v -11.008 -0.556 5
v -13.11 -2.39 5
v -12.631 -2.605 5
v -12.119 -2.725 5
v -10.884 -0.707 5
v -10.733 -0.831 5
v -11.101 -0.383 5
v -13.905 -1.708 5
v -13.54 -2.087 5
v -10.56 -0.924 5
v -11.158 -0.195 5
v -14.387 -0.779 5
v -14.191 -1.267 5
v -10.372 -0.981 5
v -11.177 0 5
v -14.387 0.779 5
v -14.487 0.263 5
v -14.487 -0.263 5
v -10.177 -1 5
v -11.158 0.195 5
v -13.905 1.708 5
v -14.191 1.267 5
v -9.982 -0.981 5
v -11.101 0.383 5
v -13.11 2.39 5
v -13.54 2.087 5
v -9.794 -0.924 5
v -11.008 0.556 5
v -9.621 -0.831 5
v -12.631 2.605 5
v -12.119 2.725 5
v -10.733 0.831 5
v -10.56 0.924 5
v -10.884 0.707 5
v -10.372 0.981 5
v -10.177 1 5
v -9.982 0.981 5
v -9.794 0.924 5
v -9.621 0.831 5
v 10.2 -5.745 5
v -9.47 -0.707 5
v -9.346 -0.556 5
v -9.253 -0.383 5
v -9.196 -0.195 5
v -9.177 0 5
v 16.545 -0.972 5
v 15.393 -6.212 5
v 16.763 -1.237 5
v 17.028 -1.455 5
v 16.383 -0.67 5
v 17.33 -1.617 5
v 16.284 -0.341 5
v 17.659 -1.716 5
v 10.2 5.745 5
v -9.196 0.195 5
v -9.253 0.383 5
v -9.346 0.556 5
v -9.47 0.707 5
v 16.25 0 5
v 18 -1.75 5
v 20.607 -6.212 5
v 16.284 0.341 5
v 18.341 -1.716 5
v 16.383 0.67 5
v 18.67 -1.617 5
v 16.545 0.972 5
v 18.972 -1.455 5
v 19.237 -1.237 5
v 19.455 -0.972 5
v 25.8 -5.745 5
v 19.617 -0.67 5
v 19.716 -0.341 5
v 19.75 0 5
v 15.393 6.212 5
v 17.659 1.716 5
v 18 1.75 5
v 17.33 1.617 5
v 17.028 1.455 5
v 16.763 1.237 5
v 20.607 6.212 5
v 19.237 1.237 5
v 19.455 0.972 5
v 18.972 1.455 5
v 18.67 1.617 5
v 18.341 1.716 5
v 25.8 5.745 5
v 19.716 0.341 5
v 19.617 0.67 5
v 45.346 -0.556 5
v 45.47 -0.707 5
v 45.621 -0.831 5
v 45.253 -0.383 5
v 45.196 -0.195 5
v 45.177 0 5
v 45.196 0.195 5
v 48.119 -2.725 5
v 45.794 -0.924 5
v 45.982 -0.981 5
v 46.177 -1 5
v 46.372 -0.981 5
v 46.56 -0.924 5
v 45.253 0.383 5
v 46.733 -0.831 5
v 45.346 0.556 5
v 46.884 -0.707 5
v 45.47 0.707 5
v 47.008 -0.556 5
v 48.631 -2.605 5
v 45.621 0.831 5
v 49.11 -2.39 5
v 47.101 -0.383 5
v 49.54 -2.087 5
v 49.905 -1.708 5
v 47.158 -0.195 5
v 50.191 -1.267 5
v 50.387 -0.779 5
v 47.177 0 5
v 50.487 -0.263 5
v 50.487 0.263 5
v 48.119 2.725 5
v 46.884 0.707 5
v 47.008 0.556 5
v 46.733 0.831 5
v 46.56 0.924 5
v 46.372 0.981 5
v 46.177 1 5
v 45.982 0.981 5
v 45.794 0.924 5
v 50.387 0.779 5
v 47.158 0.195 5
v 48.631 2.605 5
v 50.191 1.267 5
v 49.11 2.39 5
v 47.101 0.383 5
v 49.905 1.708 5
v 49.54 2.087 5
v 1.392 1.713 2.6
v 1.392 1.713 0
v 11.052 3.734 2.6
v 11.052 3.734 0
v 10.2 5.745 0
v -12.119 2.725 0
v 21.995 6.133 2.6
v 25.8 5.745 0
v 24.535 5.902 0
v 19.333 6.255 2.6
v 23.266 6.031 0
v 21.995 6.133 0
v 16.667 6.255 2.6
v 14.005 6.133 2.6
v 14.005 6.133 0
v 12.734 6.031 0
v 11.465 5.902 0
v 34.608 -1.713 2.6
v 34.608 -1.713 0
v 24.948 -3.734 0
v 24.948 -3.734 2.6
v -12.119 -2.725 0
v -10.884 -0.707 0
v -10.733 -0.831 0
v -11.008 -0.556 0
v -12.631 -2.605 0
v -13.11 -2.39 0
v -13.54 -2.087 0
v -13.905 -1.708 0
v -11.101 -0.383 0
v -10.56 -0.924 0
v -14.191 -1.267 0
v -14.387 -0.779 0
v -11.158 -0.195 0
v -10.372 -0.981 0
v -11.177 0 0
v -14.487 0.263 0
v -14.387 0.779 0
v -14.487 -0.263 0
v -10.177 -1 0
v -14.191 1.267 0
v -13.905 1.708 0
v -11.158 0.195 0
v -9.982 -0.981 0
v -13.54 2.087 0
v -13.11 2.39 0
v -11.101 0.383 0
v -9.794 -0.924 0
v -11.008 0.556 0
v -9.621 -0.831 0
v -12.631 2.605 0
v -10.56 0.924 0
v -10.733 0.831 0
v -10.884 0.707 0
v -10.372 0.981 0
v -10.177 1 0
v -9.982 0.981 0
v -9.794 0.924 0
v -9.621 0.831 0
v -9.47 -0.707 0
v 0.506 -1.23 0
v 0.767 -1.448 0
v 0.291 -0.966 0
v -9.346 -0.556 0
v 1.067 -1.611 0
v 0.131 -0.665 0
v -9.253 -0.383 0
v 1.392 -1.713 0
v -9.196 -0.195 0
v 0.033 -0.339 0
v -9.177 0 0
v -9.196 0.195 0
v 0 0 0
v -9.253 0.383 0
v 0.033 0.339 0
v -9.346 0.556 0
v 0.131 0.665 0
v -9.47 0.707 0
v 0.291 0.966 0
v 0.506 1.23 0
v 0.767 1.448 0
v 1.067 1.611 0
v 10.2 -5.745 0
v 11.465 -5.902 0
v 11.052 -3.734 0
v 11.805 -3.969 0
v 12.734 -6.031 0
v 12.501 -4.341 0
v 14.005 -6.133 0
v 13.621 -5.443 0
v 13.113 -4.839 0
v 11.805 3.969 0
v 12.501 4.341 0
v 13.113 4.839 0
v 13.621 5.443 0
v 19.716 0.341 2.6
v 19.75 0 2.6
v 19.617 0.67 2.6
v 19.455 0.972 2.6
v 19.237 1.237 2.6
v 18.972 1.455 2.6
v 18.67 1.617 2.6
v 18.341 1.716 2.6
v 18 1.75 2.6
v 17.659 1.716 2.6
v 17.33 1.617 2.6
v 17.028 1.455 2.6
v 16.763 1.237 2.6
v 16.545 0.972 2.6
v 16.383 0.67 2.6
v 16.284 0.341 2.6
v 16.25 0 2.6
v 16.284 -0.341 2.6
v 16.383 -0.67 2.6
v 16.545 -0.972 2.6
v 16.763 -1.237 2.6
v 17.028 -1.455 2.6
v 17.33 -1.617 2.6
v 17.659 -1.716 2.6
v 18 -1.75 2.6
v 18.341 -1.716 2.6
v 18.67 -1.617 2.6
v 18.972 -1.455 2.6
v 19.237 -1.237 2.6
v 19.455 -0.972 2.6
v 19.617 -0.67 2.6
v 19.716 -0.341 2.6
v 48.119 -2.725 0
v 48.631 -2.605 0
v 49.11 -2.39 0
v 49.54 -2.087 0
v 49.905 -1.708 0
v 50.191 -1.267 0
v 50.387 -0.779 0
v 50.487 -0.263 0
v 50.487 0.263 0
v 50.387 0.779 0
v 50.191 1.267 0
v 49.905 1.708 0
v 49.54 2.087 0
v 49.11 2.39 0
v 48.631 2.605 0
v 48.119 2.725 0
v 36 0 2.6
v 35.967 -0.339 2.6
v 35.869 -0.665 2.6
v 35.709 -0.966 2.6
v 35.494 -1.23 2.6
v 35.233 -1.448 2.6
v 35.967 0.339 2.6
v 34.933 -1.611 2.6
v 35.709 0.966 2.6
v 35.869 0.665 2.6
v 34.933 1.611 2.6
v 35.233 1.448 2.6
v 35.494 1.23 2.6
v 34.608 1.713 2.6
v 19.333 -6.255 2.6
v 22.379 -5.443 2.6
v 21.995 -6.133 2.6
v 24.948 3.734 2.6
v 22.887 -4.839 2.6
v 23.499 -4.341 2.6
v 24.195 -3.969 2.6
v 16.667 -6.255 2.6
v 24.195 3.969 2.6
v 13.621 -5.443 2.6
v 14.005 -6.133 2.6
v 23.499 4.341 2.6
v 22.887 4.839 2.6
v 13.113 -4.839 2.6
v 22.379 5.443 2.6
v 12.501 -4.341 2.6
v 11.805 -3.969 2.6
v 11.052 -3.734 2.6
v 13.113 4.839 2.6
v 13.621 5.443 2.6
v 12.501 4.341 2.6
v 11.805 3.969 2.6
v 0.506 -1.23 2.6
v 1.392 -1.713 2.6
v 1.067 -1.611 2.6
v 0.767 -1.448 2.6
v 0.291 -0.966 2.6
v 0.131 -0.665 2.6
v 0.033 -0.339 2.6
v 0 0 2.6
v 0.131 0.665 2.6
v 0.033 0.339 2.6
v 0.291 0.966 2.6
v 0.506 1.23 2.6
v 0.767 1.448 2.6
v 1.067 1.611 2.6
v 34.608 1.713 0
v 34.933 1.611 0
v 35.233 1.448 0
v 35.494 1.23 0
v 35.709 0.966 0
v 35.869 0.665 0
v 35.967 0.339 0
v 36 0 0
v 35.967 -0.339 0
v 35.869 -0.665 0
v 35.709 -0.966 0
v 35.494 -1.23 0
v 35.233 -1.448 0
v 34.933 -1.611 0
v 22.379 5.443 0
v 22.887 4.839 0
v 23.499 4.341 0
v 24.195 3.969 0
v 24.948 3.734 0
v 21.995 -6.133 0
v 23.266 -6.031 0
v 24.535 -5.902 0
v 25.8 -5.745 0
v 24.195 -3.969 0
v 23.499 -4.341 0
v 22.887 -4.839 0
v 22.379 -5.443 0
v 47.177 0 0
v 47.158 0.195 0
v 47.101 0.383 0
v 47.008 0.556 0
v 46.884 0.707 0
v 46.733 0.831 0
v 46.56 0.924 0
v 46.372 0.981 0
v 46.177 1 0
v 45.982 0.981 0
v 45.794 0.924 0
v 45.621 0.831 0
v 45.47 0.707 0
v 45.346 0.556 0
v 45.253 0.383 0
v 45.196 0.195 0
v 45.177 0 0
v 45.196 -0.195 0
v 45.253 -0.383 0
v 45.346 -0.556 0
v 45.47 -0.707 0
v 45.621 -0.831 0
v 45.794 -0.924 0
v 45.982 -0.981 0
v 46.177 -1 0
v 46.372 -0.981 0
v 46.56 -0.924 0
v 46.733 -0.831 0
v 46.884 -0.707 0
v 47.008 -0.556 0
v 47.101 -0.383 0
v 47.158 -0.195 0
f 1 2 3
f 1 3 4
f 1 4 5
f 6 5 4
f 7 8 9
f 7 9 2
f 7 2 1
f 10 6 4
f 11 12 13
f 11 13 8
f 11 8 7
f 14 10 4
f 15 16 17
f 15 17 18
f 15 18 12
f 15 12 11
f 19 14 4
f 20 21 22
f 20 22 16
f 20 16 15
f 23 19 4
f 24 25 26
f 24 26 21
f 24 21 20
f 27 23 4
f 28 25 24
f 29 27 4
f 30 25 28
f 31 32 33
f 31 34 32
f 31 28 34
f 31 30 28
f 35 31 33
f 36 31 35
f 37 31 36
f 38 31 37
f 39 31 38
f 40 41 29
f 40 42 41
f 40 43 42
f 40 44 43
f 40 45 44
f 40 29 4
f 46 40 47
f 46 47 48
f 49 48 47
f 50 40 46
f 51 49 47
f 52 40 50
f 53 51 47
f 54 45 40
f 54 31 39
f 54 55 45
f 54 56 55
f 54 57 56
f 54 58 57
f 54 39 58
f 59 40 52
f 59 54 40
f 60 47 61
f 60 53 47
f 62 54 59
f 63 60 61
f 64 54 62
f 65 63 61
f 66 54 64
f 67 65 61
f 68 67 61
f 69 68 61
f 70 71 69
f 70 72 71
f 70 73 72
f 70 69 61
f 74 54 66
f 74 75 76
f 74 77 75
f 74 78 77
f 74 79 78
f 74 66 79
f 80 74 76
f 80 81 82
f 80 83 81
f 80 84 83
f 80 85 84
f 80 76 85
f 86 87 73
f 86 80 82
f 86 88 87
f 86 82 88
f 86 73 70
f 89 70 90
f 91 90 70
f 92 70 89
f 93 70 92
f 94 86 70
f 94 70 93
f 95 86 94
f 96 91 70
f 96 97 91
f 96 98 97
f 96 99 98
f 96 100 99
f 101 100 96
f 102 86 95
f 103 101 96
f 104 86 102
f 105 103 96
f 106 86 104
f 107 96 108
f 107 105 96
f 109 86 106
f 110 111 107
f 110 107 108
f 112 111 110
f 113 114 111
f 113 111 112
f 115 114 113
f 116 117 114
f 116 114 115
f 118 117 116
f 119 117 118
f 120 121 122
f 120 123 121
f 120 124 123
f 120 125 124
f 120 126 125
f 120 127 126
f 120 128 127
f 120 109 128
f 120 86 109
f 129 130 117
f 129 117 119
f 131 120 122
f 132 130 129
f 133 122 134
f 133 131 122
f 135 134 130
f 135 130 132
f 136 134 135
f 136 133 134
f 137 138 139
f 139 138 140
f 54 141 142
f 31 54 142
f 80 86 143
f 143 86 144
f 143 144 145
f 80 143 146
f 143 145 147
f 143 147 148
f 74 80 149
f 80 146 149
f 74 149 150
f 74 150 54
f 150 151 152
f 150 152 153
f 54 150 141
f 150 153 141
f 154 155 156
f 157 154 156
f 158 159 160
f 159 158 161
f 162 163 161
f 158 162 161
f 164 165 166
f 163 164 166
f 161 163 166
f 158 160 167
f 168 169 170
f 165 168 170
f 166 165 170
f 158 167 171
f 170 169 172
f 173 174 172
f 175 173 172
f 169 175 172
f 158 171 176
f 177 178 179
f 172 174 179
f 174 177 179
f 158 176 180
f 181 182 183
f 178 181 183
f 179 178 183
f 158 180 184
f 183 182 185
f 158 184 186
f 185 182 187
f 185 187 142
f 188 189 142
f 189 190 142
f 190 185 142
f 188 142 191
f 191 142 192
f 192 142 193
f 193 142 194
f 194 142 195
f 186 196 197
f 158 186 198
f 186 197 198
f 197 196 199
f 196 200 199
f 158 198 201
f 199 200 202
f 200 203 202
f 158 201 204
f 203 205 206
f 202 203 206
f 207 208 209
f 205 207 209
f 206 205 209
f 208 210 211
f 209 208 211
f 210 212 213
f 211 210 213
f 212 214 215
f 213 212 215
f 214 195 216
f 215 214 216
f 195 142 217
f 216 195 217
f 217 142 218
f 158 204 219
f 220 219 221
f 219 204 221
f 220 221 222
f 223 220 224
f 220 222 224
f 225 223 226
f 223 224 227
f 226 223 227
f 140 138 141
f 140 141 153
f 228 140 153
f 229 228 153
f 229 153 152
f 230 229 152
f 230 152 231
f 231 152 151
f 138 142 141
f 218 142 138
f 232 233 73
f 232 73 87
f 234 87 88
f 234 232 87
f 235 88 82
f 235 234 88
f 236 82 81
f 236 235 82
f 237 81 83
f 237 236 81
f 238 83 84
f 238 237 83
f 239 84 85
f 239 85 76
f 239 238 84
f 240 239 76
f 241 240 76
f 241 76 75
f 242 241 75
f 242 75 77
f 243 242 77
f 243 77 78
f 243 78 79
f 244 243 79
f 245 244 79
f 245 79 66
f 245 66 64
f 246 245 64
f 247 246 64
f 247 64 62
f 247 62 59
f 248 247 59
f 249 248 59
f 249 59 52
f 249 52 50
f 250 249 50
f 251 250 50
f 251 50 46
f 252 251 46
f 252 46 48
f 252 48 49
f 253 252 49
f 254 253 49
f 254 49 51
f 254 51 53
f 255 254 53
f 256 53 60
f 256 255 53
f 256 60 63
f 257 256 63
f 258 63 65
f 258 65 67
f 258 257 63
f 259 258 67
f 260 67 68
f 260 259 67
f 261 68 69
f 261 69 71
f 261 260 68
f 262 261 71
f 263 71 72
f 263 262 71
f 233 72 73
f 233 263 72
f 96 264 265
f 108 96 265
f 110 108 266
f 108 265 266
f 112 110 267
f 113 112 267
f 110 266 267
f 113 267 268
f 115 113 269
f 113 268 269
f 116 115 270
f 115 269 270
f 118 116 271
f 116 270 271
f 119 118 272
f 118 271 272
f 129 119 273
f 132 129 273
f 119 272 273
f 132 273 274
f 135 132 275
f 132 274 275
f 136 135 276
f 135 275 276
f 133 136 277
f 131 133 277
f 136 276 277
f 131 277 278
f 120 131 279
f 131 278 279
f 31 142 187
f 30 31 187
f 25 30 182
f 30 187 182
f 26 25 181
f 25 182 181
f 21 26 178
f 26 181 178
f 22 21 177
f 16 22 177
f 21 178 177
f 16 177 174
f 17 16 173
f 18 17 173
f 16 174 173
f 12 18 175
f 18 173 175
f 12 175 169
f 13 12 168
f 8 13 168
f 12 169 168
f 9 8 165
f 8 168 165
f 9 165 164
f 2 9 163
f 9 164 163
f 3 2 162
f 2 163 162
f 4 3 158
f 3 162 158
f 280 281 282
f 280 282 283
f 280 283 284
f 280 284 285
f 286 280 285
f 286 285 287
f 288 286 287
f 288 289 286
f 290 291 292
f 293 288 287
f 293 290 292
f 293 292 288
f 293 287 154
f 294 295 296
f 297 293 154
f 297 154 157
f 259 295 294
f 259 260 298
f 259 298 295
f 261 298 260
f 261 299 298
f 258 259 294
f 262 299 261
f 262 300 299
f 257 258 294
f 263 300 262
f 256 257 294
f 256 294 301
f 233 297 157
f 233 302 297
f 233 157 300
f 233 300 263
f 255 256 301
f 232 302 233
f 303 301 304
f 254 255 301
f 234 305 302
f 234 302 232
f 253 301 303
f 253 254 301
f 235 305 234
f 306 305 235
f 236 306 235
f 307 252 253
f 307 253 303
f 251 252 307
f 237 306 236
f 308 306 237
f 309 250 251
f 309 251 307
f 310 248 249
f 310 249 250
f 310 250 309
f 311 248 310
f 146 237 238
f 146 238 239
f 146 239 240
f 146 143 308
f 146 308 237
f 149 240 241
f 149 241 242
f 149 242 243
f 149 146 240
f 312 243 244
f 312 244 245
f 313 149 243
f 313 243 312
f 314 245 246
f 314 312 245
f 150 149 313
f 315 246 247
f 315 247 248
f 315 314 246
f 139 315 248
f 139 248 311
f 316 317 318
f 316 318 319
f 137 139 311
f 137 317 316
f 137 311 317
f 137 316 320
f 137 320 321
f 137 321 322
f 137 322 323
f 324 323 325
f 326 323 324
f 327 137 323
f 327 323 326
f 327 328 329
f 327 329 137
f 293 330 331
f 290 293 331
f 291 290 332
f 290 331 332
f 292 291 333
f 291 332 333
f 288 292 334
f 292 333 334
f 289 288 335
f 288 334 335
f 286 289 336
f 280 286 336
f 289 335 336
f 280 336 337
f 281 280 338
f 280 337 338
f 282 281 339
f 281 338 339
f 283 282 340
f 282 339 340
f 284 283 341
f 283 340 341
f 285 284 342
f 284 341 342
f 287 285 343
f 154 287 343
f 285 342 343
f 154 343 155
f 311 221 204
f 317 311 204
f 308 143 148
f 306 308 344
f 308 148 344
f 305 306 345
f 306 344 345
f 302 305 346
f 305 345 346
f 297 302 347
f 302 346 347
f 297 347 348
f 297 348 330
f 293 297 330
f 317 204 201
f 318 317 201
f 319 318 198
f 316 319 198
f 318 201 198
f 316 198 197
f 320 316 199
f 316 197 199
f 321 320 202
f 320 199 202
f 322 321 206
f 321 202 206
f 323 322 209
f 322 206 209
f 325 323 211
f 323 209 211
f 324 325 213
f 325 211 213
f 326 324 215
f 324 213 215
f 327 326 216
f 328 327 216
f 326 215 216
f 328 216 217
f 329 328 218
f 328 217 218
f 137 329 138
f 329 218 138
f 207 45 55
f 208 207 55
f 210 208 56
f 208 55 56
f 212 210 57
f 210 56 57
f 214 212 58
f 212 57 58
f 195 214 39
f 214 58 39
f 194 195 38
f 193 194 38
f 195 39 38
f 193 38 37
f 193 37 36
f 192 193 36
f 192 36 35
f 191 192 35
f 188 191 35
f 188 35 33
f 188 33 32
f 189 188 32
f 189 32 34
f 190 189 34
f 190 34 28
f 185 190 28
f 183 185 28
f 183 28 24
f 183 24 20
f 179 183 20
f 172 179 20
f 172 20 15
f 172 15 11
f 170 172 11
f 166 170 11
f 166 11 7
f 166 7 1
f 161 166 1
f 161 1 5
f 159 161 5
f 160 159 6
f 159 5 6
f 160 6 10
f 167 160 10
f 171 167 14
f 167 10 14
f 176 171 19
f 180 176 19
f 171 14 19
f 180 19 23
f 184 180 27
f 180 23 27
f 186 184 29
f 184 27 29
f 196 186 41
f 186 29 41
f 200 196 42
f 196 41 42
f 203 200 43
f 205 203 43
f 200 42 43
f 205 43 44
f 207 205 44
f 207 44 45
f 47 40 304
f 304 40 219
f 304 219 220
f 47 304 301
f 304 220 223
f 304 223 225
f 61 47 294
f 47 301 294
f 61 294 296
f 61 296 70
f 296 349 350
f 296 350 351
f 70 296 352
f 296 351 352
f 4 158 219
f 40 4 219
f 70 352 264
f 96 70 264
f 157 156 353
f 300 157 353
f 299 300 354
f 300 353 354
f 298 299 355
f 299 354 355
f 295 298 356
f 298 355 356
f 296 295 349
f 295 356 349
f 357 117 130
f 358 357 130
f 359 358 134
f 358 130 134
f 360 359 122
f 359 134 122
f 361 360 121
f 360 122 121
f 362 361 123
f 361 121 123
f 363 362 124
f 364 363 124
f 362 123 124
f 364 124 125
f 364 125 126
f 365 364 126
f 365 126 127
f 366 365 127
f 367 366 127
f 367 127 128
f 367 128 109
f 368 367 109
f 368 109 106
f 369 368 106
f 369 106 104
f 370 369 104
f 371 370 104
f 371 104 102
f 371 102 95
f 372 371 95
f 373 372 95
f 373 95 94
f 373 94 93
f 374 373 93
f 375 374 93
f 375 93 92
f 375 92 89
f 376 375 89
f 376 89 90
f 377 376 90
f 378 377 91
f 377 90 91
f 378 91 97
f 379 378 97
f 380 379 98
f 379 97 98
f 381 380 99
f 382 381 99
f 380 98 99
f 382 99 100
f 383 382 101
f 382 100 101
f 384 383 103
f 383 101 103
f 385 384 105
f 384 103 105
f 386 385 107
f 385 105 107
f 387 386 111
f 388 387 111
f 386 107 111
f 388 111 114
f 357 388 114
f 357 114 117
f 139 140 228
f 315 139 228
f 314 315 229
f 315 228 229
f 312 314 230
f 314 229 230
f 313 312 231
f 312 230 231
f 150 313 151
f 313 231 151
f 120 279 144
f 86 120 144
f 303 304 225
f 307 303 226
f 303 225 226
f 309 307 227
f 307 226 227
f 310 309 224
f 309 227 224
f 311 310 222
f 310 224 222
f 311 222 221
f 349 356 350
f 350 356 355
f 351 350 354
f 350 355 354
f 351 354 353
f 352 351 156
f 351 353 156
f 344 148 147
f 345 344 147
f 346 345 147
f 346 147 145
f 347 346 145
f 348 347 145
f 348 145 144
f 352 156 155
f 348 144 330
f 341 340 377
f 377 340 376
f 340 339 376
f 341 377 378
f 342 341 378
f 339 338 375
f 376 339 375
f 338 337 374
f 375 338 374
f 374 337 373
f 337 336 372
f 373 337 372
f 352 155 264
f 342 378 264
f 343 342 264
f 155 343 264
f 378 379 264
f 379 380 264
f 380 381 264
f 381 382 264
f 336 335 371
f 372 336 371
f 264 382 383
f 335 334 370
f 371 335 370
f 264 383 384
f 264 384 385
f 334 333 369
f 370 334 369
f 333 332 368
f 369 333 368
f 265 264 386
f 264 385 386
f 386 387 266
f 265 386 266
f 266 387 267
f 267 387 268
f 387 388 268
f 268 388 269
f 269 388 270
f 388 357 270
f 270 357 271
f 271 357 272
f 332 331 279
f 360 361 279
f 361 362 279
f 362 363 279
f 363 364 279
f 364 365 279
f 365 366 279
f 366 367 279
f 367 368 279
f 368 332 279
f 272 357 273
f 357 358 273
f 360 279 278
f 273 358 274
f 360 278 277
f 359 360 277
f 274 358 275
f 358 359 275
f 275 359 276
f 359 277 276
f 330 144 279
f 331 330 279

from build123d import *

# Parameters (mm, degrees)
SCHIZZO5_R                   = 1.75
ESTRUSIONE_ESTRUSIONE3_DEPTH = 5
SCHIZZO1_R                   = 1.75
TAGLIO_ESTRUSIONE3_DEPTH     = 2.6
SCHIZZO6_R                   = 1
TAGLIO_ESTRUSIONE4_DEPTH     = 10


with BuildPart() as part:
    # Schizzo5 → Estrusione-Estrusione3 (new body)
    with BuildSketch(Plane.XY):
        with BuildLine():
            Line((-12.11870493, -2.725170944), (10.199561172, -5.744744727))
            ThreePointArc((10.199561172, -5.744744727), (18, -6.270036134), (25.800438828, -5.744744727))
            Line((25.800438828, -5.744744727), (48.11870493, -2.725170944))
            ThreePointArc((48.11870493, -2.725170944), (50.5, 0), (48.11870493, 2.725170944))
            Line((48.11870493, 2.725170944), (25.800438828, 5.744744727))
            ThreePointArc((25.800438828, 5.744744727), (18, 6.270036134), (10.199561172, 5.744744727))
            Line((10.199561172, 5.744744727), (-12.11870493, 2.725170944))
            ThreePointArc((-12.11870493, 2.725170944), (-14.5, 0), (-12.11870493, -2.725170944))
        make_face()
        with Locations((18, 0)):
            Circle(SCHIZZO5_R, mode=Mode.SUBTRACT)
    extrude(amount=ESTRUSIONE_ESTRUSIONE3_DEPTH)

    # Schizzo1 → Taglio-Estrusione3 (cut)
    with BuildSketch(Plane.XY):
        with BuildLine():
            Line((24.948441202, 3.734278154), (34.608428908, 1.712900674))
            ThreePointArc((34.608428908, 1.712900674), (36, 0), (34.608428908, -1.712900674))
            Line((34.608428908, -1.712900674), (24.948441202, -3.734278154))
            ThreePointArc((24.948441202, -3.734278154), (22.862554311, -4.862554311), (21.734278154, -6.948441202))
            Line((21.734278154, -6.948441202), (19.712900674, -16.608428908))
            ThreePointArc((19.712900674, -16.608428908), (18, -18), (16.287099326, -16.608428908))
            Line((16.287099326, -16.608428908), (14.265721846, -6.948441202))
            ThreePointArc((14.265721846, -6.948441202), (13.137445689, -4.862554311), (11.051558798, -3.734278154))
            Line((11.051558798, -3.734278154), (1.391571092, -1.712900674))
            ThreePointArc((1.391571092, -1.712900674), (0, 0), (1.391571092, 1.712900674))
            Line((1.391571092, 1.712900674), (11.051558798, 3.734278154))
            ThreePointArc((11.051558798, 3.734278154), (13.137445689, 4.862554311), (14.265721846, 6.948441202))
            Line((14.265721846, 6.948441202), (16.287099326, 16.608428908))
            ThreePointArc((16.287099326, 16.608428908), (18, 18), (19.712900674, 16.608428908))
            Line((19.712900674, 16.608428908), (21.734278154, 6.948441202))
            ThreePointArc((21.734278154, 6.948441202), (22.862554311, 4.862554311), (24.948441202, 3.734278154))
        make_face()
        with Locations((18, 0)):
            Circle(SCHIZZO1_R, mode=Mode.SUBTRACT)
    extrude(amount=TAGLIO_ESTRUSIONE3_DEPTH, mode=Mode.SUBTRACT)

    # Schizzo6 → Taglio-Estrusione4 (cut)
    with BuildSketch(Plane.XY.offset(5)):
        with Locations((-10.176984684, 0)):
            Circle(SCHIZZO6_R)
        with Locations((46.176984684, 0)):
            Circle(SCHIZZO6_R)
    extrude(amount=-TAGLIO_ESTRUSIONE4_DEPTH, mode=Mode.SUBTRACT)


solid = part.part
